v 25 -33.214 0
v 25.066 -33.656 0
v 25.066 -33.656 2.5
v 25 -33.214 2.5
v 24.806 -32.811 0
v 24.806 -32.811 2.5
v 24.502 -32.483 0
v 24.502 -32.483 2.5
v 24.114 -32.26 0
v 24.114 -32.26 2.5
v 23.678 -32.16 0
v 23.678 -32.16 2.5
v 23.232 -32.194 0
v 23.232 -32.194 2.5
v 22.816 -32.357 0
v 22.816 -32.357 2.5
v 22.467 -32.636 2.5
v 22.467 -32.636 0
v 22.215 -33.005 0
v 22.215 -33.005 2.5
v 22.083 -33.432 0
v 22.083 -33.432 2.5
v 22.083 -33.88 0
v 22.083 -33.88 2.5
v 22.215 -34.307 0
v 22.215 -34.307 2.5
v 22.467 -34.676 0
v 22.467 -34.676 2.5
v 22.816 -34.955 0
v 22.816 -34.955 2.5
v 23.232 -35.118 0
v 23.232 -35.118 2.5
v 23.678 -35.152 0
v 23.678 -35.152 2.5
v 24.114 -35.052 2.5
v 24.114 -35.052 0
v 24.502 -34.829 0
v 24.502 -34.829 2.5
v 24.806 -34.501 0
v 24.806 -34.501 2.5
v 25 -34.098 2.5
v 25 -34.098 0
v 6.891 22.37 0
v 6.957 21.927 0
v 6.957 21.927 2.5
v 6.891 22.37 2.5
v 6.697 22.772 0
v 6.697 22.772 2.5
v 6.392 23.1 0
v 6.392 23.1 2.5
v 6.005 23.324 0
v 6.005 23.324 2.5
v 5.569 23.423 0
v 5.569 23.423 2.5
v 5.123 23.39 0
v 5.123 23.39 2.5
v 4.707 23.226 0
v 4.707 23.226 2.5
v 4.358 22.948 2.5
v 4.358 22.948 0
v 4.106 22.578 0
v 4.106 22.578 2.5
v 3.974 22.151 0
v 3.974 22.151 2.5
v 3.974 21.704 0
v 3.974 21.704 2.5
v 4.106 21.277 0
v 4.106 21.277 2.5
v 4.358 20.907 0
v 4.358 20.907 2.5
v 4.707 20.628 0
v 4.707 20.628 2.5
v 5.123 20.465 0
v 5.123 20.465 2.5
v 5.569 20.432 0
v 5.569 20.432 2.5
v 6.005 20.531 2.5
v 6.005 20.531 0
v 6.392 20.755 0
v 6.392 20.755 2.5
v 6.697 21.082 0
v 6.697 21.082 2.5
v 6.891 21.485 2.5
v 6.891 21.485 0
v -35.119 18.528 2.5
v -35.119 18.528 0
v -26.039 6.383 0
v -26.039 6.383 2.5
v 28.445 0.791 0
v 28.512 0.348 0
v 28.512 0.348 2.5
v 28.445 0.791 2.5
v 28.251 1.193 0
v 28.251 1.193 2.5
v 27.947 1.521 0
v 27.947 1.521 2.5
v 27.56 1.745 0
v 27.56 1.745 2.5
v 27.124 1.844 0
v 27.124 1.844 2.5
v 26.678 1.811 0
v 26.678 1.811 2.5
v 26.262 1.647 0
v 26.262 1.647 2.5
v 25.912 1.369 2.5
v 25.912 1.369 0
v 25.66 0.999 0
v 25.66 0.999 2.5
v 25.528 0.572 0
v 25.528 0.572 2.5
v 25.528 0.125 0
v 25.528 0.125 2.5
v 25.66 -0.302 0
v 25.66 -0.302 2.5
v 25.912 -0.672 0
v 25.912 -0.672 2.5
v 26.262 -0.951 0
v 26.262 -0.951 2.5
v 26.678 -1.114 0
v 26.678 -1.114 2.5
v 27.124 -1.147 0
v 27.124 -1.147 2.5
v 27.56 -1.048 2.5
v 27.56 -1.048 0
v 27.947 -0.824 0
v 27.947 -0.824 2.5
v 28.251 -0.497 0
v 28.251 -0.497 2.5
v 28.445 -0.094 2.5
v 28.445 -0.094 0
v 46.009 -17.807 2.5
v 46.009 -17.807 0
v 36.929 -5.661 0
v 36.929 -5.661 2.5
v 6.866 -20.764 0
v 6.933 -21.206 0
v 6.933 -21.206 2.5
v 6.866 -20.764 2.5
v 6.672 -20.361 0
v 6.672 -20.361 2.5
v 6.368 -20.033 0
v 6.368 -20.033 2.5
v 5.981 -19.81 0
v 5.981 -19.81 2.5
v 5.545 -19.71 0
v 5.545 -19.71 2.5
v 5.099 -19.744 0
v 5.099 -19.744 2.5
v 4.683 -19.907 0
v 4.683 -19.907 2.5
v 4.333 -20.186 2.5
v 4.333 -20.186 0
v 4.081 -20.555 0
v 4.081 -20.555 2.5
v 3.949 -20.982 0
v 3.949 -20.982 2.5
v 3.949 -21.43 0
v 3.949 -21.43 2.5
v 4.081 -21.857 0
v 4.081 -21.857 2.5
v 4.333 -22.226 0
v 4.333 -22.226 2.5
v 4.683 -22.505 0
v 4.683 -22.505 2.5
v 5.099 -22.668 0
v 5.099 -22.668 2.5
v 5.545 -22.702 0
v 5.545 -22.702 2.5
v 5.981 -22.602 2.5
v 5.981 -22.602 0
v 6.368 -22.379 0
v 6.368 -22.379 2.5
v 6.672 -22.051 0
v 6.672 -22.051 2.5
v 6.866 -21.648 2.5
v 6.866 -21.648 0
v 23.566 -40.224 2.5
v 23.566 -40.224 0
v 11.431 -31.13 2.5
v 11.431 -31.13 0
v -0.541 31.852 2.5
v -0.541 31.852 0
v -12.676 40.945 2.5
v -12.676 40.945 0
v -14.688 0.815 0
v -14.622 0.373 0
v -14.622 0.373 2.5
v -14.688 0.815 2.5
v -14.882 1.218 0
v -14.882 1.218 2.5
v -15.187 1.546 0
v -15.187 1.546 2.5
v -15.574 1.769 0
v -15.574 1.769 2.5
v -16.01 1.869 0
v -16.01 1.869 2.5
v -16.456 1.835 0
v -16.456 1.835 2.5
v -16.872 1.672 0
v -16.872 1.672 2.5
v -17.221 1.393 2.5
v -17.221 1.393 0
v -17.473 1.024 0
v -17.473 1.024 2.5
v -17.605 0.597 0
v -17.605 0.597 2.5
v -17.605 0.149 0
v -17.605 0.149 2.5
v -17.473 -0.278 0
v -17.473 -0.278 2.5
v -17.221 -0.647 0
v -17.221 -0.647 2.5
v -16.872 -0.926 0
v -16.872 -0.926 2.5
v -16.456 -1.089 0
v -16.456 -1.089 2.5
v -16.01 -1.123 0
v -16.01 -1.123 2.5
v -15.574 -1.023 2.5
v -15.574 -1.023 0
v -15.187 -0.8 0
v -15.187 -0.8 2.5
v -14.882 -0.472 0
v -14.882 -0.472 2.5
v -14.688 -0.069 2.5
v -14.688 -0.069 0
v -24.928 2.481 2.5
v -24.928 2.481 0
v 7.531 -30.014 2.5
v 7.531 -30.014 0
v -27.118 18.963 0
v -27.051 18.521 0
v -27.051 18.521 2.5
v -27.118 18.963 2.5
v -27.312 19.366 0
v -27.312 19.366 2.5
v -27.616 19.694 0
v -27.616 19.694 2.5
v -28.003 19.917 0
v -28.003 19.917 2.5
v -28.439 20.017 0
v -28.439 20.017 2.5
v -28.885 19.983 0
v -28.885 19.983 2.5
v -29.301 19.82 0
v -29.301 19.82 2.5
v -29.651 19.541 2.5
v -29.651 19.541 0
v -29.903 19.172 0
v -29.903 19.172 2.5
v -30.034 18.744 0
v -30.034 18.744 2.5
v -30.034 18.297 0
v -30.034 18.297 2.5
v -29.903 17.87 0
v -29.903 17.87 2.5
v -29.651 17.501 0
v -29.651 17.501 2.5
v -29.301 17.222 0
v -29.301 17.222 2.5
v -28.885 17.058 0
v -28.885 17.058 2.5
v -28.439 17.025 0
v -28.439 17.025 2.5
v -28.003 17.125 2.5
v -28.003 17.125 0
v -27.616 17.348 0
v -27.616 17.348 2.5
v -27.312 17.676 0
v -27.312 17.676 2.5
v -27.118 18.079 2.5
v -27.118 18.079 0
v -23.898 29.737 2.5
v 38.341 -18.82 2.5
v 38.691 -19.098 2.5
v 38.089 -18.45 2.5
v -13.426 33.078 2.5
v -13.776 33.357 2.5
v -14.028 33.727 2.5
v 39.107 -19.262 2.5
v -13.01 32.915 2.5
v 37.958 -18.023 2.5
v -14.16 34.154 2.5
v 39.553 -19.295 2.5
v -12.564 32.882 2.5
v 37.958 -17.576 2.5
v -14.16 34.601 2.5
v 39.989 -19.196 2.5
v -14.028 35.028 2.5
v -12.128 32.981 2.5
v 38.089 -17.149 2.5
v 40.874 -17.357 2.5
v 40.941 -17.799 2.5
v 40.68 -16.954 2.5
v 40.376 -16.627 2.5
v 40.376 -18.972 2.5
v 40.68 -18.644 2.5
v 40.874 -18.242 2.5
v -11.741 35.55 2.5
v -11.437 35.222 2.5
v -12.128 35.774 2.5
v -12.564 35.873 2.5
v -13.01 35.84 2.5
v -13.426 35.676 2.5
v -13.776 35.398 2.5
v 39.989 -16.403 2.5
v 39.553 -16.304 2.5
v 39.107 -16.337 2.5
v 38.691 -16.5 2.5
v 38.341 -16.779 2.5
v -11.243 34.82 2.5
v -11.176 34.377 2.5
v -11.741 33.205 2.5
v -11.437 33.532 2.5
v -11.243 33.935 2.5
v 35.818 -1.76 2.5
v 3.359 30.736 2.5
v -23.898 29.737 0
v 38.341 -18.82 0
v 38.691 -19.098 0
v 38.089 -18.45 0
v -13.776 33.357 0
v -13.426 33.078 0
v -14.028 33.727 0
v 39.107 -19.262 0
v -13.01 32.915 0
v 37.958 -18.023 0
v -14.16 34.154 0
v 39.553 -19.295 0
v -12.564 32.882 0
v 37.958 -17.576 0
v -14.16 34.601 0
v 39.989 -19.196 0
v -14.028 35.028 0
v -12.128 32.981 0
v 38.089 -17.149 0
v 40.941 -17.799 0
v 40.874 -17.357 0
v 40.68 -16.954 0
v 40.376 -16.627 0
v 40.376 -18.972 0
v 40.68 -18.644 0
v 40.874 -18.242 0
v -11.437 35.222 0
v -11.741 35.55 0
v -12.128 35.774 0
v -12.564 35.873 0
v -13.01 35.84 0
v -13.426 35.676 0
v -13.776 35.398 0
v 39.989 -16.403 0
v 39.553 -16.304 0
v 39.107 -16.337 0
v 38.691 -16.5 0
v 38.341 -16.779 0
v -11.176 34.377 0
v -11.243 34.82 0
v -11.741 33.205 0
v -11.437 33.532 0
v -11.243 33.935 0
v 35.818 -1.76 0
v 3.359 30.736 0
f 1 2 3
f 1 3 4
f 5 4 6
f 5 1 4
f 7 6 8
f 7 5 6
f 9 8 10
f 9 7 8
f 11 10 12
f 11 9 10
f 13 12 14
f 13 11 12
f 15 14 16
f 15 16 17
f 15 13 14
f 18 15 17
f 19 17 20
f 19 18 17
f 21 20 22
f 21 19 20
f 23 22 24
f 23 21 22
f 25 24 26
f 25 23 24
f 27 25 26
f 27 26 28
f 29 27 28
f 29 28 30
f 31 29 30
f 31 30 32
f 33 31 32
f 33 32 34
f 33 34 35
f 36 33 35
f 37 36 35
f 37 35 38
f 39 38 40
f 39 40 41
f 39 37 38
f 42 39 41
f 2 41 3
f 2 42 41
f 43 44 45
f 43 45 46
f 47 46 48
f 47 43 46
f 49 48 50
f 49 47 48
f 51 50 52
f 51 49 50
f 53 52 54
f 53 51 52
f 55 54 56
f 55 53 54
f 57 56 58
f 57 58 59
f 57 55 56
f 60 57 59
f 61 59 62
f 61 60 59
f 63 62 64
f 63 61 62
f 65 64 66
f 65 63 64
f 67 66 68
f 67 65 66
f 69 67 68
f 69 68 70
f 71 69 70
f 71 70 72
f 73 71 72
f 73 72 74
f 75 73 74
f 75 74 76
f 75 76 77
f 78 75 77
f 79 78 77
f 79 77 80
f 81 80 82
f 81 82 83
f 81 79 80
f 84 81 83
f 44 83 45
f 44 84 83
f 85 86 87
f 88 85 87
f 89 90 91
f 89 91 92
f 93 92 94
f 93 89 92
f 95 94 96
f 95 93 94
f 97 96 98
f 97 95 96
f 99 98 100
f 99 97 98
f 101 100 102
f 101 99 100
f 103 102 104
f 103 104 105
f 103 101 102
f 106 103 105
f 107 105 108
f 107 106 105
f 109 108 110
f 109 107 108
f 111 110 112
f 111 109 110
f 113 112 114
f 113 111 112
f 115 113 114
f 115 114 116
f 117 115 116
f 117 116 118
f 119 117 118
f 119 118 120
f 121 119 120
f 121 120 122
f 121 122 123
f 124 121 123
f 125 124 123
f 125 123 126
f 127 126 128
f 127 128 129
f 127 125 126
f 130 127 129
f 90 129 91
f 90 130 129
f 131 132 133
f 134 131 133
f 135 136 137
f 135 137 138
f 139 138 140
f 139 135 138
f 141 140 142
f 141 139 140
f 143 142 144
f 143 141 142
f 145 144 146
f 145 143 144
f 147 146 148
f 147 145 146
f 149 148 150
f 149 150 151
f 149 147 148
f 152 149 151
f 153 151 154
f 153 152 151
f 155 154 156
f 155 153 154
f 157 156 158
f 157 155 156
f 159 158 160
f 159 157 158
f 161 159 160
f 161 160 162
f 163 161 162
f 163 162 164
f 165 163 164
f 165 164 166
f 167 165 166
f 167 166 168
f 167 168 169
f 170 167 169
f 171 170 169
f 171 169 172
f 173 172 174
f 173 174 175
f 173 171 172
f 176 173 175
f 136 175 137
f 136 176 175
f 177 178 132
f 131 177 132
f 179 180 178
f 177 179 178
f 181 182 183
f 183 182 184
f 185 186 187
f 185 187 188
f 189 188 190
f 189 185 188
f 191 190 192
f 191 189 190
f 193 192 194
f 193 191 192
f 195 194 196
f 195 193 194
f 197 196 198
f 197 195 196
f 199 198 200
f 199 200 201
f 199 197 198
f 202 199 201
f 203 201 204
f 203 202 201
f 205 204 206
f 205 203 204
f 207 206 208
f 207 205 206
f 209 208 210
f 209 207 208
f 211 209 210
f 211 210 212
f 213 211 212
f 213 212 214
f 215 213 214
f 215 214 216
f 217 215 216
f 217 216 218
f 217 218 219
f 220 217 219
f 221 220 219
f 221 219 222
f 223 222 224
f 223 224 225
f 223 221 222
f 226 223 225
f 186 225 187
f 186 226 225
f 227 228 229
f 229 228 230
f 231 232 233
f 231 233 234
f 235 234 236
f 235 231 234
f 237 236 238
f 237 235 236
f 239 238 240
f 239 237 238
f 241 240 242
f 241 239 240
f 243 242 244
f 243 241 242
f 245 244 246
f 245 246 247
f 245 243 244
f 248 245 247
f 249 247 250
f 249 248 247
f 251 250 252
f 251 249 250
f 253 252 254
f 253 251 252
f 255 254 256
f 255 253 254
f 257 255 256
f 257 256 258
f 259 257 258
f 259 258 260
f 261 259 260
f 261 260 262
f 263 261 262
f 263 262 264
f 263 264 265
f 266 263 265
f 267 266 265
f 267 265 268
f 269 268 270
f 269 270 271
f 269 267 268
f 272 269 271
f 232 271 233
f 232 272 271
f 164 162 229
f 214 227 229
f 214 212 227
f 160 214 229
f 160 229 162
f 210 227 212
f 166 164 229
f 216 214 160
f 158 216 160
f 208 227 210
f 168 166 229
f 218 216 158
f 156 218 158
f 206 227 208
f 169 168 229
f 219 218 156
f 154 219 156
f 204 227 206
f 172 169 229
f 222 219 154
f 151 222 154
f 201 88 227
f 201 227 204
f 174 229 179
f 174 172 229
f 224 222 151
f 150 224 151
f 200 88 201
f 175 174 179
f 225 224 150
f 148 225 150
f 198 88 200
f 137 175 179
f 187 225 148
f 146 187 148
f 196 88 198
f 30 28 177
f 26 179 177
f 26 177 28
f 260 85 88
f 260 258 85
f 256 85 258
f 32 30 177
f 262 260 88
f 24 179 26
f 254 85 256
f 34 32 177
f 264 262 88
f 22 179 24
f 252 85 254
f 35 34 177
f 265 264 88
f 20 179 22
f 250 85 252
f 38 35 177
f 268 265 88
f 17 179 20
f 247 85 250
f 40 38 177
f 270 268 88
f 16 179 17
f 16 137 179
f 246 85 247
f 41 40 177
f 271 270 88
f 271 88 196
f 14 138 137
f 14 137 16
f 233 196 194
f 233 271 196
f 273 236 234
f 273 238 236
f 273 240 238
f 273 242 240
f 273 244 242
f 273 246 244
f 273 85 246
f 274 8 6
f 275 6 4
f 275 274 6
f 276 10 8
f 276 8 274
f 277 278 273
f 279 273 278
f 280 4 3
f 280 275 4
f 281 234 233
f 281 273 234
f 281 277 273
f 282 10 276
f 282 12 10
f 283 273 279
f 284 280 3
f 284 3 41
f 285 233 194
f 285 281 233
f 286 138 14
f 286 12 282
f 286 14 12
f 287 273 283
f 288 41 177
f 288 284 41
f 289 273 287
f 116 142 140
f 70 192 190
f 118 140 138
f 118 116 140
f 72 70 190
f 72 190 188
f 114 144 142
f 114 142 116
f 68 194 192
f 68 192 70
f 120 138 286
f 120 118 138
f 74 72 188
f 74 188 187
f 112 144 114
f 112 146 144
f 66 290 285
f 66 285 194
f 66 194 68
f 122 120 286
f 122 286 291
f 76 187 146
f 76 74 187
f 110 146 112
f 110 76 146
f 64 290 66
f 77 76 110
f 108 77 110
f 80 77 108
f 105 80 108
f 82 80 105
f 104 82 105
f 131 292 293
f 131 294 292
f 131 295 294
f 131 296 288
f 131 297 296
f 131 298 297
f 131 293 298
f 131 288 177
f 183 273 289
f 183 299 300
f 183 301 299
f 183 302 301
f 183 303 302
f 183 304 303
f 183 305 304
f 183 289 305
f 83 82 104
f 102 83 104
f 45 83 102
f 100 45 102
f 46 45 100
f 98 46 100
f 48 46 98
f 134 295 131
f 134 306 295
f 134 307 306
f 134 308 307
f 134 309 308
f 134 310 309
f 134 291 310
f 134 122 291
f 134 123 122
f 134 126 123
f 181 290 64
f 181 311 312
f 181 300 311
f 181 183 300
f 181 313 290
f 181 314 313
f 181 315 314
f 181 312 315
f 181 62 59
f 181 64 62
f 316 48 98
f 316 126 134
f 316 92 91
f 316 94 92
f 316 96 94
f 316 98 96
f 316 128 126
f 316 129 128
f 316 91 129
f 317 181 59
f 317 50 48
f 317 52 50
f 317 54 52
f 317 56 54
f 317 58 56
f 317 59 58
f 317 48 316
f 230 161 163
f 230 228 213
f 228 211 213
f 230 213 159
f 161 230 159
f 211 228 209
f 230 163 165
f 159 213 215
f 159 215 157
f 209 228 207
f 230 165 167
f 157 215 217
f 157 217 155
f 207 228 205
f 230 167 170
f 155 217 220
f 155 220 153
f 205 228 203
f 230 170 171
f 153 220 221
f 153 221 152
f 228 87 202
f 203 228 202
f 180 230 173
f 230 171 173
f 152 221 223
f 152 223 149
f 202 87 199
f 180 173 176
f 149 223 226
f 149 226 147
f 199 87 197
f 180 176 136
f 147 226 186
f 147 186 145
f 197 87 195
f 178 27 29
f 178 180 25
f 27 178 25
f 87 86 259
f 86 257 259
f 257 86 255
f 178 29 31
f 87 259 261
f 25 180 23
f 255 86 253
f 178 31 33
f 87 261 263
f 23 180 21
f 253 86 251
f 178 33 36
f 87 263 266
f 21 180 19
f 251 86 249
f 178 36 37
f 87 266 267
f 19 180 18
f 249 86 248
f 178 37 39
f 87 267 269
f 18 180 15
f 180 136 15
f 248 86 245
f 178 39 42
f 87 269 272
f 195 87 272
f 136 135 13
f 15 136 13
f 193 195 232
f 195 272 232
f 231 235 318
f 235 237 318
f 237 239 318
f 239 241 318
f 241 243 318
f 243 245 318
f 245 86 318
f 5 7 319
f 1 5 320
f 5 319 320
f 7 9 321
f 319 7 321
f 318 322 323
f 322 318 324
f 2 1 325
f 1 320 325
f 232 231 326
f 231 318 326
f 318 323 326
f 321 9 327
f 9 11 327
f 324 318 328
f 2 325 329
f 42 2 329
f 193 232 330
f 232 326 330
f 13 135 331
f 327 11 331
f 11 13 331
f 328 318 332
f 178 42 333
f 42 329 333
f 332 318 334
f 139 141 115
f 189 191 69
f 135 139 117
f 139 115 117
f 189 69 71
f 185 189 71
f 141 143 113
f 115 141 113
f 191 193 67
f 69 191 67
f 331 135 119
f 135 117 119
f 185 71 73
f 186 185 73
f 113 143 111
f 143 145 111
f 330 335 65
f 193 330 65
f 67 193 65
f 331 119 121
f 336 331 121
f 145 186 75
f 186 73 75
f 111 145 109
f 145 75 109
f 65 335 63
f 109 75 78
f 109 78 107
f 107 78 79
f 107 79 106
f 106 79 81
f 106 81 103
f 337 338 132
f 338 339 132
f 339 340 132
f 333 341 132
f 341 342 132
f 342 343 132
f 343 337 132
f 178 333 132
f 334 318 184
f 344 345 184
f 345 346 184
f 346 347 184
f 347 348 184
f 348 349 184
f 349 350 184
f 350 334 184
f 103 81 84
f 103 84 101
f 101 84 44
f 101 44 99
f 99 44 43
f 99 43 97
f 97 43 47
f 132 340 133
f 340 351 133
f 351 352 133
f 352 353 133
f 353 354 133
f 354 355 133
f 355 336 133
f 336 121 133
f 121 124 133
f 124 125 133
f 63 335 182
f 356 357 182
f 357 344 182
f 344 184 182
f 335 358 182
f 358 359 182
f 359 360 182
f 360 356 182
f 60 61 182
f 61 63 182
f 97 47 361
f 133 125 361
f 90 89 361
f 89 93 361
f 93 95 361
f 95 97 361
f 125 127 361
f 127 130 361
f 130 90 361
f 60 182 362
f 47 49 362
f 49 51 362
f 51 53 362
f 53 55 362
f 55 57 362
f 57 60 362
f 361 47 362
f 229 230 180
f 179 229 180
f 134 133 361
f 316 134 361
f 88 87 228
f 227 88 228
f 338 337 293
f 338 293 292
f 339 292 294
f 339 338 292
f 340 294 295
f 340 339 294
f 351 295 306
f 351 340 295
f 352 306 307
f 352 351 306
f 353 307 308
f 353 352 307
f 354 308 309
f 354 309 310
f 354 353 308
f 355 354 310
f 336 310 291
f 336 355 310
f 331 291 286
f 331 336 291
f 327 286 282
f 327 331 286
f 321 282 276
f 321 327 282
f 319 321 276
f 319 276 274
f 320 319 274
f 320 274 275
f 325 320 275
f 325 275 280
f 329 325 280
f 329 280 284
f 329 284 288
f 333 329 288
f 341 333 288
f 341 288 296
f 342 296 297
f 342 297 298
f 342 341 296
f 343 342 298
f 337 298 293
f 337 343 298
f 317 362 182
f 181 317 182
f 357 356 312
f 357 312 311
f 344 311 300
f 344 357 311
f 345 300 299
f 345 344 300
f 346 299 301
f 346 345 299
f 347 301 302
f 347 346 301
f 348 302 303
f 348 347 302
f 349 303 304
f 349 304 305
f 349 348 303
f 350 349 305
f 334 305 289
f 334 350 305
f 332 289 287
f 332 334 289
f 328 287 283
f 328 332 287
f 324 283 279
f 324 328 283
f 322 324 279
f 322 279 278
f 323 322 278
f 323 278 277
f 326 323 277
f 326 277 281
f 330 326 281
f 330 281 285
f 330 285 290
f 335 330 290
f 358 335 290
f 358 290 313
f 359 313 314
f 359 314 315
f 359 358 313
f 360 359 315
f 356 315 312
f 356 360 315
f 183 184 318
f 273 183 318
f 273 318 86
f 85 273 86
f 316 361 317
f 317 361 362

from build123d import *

# Parameters (mm, degrees)
F0_R     = 1.5
F1_DEPTH = 2.5


with BuildPart() as f1:
    # F0 (on Top) → F1 (new body)
    with BuildSketch(Plane.XY):
        Polygon((-24.927709, 2.481071), (7.530662, -30.014294), (11.431097, -31.130232), (23.566268, -40.223594), (34.787399, -29.015238), (46.00853, -17.806882), (36.928996, -5.66136), (35.817502, -1.759657), (3.359131, 30.735708), (-0.541304, 31.851646), (-12.676475, 40.945009), (-23.897606, 29.736653), (-35.118737, 18.528296), (-26.039203, 6.382775), align=None)
        with Locations((5.432613, -21.206046)):
            Circle(F0_R, mode=Mode.SUBTRACT)
        with Locations((23.566268, -33.655995)):
            Circle(F0_R, mode=Mode.SUBTRACT)
        with Locations((39.440935, -17.799401)):
            Circle(F0_R, mode=Mode.SUBTRACT)
        with Locations((27.01165, 0.348424)):
            Circle(F0_R, mode=Mode.SUBTRACT)
        with Locations((-16.121857, 0.372991)):
            Circle(F0_R, mode=Mode.SUBTRACT)
        with Locations((-28.551142, 18.520815)):
            Circle(F0_R, mode=Mode.SUBTRACT)
        with Locations((-12.676475, 34.37741)):
            Circle(F0_R, mode=Mode.SUBTRACT)
        with Locations((5.45718, 21.927461)):
            Circle(F0_R, mode=Mode.SUBTRACT)
    extrude(amount=F1_DEPTH)


solid = f1.part
